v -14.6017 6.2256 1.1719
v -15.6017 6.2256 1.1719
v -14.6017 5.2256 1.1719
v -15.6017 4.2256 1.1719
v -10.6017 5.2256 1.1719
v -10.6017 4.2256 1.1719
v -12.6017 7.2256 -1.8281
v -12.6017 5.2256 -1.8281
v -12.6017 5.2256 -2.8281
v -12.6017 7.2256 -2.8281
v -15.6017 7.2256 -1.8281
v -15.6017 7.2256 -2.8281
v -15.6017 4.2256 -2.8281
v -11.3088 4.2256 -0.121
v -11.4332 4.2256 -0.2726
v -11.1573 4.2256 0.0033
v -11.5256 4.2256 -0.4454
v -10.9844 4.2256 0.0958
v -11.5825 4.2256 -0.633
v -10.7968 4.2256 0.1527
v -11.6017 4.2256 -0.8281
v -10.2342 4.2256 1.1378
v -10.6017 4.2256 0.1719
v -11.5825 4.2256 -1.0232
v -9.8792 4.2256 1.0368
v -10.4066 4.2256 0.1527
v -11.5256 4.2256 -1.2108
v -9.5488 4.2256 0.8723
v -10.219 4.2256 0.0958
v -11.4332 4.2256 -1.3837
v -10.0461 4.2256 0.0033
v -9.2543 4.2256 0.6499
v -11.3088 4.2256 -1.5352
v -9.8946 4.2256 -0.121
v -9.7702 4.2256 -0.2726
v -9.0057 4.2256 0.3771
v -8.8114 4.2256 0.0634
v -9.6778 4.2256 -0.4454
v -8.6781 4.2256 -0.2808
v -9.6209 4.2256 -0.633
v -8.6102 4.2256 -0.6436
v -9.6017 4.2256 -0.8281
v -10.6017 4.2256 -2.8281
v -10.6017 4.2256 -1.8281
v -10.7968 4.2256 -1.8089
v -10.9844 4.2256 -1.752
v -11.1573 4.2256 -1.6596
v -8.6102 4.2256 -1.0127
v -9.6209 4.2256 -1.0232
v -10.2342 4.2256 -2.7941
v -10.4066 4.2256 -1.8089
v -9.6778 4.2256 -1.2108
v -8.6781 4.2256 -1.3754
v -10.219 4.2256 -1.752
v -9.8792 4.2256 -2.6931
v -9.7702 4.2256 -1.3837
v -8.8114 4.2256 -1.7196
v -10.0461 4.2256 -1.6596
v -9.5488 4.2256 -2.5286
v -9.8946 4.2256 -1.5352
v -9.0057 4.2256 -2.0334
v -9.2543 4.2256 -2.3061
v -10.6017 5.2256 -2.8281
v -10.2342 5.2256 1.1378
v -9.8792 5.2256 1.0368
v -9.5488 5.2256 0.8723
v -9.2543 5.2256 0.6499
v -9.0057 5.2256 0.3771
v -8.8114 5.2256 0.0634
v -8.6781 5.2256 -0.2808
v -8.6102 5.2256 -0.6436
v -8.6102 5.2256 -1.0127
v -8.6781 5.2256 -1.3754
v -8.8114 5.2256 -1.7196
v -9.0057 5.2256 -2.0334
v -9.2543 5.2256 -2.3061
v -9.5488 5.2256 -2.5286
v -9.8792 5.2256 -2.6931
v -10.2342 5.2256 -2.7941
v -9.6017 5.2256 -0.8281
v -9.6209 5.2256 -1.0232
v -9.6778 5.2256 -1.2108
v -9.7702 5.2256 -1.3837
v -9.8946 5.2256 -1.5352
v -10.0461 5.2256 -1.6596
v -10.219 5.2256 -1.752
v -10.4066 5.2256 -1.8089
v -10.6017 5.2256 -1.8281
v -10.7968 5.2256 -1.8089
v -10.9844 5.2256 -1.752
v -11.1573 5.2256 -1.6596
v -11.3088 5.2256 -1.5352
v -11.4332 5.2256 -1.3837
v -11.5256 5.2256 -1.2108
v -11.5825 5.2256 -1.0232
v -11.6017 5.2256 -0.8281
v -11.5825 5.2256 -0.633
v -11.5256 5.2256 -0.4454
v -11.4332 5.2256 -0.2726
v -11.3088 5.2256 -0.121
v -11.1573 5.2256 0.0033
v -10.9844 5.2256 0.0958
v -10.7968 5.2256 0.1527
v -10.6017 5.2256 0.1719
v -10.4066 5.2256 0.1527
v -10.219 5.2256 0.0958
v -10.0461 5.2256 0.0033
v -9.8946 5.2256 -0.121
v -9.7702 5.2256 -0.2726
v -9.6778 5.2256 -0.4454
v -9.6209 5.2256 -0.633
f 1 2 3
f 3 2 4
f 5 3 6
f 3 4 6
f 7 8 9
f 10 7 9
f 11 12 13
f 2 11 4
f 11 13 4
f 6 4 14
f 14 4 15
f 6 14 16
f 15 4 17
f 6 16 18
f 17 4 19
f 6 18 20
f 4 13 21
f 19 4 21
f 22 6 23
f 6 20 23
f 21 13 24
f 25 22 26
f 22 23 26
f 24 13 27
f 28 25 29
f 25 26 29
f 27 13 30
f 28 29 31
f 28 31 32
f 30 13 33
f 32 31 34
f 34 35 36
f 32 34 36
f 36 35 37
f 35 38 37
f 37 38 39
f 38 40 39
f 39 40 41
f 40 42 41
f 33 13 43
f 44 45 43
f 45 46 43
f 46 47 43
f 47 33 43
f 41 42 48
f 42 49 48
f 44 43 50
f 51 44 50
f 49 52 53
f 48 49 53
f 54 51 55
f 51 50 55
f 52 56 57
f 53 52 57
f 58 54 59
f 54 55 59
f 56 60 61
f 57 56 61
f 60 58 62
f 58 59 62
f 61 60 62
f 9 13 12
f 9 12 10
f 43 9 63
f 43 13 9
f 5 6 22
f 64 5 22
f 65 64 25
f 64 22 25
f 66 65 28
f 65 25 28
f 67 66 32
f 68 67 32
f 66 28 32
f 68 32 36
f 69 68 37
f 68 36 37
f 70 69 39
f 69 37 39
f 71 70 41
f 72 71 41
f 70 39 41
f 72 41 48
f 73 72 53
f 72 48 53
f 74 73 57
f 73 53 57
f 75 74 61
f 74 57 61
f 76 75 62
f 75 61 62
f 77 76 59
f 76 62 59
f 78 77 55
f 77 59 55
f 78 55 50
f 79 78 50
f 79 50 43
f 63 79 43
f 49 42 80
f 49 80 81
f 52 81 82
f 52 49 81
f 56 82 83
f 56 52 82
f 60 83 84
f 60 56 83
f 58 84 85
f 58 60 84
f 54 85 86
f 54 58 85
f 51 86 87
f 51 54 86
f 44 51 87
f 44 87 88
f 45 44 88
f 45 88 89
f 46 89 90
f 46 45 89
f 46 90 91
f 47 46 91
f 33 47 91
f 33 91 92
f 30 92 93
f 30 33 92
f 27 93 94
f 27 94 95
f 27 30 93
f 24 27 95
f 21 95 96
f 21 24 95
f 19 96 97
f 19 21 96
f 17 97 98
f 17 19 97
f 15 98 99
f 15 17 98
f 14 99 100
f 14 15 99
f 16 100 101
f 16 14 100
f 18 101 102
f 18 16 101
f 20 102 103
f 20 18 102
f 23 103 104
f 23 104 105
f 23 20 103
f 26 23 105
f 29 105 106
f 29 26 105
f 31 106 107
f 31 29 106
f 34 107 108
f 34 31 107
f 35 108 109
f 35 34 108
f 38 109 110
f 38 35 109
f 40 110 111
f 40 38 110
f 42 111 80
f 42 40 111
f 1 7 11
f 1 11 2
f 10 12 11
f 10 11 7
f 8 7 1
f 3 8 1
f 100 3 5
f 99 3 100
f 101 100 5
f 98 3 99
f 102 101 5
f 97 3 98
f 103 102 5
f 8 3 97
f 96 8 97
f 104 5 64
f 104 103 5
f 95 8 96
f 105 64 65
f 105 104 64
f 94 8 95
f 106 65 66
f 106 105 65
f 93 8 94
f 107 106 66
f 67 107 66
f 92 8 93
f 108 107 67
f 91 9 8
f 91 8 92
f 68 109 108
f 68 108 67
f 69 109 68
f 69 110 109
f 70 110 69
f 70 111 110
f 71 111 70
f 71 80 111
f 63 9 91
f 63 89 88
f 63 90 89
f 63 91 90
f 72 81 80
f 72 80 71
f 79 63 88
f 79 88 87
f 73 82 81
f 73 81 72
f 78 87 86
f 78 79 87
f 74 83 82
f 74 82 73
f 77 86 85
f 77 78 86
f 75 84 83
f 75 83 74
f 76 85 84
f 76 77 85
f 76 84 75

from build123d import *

# Parameters (mm, degrees)
SKETCH_1_R          = 5
EXTRUDE_1_DEPTH     = 5
SKETCH_1_3_W        = 15
SKETCH_1_3_H        = 20
EXTRUDE_2_DEPTH     = 15
CUT_EXTRUDE_1_DEPTH = 15
CUT_EXTRUDE_2_DEPTH = 10
SCALE_1_SCALE       = 0.2


with BuildPart() as part:
    # 草圖1 → 填料-伸長1 (new body)
    with BuildSketch(Plane(origin=(0, 0, 0), x_dir=(1, 0, 0), z_dir=(0, 1, 0))):
        with BuildLine():
            ThreePointArc((0, -10), (10, 0), (0, 10))
            Line((0, 10), (-10, 10))
            Line((-10, 10), (-10, 5))
            Line((-10, 5), (-10, -10))
            Line((-10, -10), (0, -10))
        make_face()
        Circle(SKETCH_1_R, mode=Mode.SUBTRACT)
    extrude(amount=EXTRUDE_1_DEPTH)

    # 草圖1<3> → 填料-伸長2 (add)
    with BuildSketch(Plane(origin=(0, 0, 0), x_dir=(1, 0, 0), z_dir=(0, 1, 0))):
        with Locations((-17.5, 0)):
            Rectangle(SKETCH_1_3_W, SKETCH_1_3_H)
    extrude(amount=EXTRUDE_2_DEPTH)

    # 草圖3 → 除料-伸長1 (cut)
    with BuildSketch(Plane(origin=(-10, 0, 0), x_dir=(0, 0, -1), z_dir=(1, 0, 0))):
        Polygon((5, 15), (-10, 10), (-10, 15), align=None)
    extrude(amount=-CUT_EXTRUDE_1_DEPTH, mode=Mode.SUBTRACT)

    # 草圖2 → 除料-伸長2 (cut)
    with BuildSketch(Plane(origin=(0, 15, 0), x_dir=(1, 0, 0), z_dir=(0, 1, 0))):
        Polygon((-10, 5), (-20, -10), (-10, -10), align=None)
    extrude(amount=-CUT_EXTRUDE_2_DEPTH, mode=Mode.SUBTRACT)


with BuildPart() as part_1:
    # 縮放比例1: scaled about (-13.252128035, 5.281976431, -1.035154021)
    add(part.part.scale(SCALE_1_SCALE).moved(Location((-10.601702428, 4.225581145, -0.828123217))))


solid = part_1.part
